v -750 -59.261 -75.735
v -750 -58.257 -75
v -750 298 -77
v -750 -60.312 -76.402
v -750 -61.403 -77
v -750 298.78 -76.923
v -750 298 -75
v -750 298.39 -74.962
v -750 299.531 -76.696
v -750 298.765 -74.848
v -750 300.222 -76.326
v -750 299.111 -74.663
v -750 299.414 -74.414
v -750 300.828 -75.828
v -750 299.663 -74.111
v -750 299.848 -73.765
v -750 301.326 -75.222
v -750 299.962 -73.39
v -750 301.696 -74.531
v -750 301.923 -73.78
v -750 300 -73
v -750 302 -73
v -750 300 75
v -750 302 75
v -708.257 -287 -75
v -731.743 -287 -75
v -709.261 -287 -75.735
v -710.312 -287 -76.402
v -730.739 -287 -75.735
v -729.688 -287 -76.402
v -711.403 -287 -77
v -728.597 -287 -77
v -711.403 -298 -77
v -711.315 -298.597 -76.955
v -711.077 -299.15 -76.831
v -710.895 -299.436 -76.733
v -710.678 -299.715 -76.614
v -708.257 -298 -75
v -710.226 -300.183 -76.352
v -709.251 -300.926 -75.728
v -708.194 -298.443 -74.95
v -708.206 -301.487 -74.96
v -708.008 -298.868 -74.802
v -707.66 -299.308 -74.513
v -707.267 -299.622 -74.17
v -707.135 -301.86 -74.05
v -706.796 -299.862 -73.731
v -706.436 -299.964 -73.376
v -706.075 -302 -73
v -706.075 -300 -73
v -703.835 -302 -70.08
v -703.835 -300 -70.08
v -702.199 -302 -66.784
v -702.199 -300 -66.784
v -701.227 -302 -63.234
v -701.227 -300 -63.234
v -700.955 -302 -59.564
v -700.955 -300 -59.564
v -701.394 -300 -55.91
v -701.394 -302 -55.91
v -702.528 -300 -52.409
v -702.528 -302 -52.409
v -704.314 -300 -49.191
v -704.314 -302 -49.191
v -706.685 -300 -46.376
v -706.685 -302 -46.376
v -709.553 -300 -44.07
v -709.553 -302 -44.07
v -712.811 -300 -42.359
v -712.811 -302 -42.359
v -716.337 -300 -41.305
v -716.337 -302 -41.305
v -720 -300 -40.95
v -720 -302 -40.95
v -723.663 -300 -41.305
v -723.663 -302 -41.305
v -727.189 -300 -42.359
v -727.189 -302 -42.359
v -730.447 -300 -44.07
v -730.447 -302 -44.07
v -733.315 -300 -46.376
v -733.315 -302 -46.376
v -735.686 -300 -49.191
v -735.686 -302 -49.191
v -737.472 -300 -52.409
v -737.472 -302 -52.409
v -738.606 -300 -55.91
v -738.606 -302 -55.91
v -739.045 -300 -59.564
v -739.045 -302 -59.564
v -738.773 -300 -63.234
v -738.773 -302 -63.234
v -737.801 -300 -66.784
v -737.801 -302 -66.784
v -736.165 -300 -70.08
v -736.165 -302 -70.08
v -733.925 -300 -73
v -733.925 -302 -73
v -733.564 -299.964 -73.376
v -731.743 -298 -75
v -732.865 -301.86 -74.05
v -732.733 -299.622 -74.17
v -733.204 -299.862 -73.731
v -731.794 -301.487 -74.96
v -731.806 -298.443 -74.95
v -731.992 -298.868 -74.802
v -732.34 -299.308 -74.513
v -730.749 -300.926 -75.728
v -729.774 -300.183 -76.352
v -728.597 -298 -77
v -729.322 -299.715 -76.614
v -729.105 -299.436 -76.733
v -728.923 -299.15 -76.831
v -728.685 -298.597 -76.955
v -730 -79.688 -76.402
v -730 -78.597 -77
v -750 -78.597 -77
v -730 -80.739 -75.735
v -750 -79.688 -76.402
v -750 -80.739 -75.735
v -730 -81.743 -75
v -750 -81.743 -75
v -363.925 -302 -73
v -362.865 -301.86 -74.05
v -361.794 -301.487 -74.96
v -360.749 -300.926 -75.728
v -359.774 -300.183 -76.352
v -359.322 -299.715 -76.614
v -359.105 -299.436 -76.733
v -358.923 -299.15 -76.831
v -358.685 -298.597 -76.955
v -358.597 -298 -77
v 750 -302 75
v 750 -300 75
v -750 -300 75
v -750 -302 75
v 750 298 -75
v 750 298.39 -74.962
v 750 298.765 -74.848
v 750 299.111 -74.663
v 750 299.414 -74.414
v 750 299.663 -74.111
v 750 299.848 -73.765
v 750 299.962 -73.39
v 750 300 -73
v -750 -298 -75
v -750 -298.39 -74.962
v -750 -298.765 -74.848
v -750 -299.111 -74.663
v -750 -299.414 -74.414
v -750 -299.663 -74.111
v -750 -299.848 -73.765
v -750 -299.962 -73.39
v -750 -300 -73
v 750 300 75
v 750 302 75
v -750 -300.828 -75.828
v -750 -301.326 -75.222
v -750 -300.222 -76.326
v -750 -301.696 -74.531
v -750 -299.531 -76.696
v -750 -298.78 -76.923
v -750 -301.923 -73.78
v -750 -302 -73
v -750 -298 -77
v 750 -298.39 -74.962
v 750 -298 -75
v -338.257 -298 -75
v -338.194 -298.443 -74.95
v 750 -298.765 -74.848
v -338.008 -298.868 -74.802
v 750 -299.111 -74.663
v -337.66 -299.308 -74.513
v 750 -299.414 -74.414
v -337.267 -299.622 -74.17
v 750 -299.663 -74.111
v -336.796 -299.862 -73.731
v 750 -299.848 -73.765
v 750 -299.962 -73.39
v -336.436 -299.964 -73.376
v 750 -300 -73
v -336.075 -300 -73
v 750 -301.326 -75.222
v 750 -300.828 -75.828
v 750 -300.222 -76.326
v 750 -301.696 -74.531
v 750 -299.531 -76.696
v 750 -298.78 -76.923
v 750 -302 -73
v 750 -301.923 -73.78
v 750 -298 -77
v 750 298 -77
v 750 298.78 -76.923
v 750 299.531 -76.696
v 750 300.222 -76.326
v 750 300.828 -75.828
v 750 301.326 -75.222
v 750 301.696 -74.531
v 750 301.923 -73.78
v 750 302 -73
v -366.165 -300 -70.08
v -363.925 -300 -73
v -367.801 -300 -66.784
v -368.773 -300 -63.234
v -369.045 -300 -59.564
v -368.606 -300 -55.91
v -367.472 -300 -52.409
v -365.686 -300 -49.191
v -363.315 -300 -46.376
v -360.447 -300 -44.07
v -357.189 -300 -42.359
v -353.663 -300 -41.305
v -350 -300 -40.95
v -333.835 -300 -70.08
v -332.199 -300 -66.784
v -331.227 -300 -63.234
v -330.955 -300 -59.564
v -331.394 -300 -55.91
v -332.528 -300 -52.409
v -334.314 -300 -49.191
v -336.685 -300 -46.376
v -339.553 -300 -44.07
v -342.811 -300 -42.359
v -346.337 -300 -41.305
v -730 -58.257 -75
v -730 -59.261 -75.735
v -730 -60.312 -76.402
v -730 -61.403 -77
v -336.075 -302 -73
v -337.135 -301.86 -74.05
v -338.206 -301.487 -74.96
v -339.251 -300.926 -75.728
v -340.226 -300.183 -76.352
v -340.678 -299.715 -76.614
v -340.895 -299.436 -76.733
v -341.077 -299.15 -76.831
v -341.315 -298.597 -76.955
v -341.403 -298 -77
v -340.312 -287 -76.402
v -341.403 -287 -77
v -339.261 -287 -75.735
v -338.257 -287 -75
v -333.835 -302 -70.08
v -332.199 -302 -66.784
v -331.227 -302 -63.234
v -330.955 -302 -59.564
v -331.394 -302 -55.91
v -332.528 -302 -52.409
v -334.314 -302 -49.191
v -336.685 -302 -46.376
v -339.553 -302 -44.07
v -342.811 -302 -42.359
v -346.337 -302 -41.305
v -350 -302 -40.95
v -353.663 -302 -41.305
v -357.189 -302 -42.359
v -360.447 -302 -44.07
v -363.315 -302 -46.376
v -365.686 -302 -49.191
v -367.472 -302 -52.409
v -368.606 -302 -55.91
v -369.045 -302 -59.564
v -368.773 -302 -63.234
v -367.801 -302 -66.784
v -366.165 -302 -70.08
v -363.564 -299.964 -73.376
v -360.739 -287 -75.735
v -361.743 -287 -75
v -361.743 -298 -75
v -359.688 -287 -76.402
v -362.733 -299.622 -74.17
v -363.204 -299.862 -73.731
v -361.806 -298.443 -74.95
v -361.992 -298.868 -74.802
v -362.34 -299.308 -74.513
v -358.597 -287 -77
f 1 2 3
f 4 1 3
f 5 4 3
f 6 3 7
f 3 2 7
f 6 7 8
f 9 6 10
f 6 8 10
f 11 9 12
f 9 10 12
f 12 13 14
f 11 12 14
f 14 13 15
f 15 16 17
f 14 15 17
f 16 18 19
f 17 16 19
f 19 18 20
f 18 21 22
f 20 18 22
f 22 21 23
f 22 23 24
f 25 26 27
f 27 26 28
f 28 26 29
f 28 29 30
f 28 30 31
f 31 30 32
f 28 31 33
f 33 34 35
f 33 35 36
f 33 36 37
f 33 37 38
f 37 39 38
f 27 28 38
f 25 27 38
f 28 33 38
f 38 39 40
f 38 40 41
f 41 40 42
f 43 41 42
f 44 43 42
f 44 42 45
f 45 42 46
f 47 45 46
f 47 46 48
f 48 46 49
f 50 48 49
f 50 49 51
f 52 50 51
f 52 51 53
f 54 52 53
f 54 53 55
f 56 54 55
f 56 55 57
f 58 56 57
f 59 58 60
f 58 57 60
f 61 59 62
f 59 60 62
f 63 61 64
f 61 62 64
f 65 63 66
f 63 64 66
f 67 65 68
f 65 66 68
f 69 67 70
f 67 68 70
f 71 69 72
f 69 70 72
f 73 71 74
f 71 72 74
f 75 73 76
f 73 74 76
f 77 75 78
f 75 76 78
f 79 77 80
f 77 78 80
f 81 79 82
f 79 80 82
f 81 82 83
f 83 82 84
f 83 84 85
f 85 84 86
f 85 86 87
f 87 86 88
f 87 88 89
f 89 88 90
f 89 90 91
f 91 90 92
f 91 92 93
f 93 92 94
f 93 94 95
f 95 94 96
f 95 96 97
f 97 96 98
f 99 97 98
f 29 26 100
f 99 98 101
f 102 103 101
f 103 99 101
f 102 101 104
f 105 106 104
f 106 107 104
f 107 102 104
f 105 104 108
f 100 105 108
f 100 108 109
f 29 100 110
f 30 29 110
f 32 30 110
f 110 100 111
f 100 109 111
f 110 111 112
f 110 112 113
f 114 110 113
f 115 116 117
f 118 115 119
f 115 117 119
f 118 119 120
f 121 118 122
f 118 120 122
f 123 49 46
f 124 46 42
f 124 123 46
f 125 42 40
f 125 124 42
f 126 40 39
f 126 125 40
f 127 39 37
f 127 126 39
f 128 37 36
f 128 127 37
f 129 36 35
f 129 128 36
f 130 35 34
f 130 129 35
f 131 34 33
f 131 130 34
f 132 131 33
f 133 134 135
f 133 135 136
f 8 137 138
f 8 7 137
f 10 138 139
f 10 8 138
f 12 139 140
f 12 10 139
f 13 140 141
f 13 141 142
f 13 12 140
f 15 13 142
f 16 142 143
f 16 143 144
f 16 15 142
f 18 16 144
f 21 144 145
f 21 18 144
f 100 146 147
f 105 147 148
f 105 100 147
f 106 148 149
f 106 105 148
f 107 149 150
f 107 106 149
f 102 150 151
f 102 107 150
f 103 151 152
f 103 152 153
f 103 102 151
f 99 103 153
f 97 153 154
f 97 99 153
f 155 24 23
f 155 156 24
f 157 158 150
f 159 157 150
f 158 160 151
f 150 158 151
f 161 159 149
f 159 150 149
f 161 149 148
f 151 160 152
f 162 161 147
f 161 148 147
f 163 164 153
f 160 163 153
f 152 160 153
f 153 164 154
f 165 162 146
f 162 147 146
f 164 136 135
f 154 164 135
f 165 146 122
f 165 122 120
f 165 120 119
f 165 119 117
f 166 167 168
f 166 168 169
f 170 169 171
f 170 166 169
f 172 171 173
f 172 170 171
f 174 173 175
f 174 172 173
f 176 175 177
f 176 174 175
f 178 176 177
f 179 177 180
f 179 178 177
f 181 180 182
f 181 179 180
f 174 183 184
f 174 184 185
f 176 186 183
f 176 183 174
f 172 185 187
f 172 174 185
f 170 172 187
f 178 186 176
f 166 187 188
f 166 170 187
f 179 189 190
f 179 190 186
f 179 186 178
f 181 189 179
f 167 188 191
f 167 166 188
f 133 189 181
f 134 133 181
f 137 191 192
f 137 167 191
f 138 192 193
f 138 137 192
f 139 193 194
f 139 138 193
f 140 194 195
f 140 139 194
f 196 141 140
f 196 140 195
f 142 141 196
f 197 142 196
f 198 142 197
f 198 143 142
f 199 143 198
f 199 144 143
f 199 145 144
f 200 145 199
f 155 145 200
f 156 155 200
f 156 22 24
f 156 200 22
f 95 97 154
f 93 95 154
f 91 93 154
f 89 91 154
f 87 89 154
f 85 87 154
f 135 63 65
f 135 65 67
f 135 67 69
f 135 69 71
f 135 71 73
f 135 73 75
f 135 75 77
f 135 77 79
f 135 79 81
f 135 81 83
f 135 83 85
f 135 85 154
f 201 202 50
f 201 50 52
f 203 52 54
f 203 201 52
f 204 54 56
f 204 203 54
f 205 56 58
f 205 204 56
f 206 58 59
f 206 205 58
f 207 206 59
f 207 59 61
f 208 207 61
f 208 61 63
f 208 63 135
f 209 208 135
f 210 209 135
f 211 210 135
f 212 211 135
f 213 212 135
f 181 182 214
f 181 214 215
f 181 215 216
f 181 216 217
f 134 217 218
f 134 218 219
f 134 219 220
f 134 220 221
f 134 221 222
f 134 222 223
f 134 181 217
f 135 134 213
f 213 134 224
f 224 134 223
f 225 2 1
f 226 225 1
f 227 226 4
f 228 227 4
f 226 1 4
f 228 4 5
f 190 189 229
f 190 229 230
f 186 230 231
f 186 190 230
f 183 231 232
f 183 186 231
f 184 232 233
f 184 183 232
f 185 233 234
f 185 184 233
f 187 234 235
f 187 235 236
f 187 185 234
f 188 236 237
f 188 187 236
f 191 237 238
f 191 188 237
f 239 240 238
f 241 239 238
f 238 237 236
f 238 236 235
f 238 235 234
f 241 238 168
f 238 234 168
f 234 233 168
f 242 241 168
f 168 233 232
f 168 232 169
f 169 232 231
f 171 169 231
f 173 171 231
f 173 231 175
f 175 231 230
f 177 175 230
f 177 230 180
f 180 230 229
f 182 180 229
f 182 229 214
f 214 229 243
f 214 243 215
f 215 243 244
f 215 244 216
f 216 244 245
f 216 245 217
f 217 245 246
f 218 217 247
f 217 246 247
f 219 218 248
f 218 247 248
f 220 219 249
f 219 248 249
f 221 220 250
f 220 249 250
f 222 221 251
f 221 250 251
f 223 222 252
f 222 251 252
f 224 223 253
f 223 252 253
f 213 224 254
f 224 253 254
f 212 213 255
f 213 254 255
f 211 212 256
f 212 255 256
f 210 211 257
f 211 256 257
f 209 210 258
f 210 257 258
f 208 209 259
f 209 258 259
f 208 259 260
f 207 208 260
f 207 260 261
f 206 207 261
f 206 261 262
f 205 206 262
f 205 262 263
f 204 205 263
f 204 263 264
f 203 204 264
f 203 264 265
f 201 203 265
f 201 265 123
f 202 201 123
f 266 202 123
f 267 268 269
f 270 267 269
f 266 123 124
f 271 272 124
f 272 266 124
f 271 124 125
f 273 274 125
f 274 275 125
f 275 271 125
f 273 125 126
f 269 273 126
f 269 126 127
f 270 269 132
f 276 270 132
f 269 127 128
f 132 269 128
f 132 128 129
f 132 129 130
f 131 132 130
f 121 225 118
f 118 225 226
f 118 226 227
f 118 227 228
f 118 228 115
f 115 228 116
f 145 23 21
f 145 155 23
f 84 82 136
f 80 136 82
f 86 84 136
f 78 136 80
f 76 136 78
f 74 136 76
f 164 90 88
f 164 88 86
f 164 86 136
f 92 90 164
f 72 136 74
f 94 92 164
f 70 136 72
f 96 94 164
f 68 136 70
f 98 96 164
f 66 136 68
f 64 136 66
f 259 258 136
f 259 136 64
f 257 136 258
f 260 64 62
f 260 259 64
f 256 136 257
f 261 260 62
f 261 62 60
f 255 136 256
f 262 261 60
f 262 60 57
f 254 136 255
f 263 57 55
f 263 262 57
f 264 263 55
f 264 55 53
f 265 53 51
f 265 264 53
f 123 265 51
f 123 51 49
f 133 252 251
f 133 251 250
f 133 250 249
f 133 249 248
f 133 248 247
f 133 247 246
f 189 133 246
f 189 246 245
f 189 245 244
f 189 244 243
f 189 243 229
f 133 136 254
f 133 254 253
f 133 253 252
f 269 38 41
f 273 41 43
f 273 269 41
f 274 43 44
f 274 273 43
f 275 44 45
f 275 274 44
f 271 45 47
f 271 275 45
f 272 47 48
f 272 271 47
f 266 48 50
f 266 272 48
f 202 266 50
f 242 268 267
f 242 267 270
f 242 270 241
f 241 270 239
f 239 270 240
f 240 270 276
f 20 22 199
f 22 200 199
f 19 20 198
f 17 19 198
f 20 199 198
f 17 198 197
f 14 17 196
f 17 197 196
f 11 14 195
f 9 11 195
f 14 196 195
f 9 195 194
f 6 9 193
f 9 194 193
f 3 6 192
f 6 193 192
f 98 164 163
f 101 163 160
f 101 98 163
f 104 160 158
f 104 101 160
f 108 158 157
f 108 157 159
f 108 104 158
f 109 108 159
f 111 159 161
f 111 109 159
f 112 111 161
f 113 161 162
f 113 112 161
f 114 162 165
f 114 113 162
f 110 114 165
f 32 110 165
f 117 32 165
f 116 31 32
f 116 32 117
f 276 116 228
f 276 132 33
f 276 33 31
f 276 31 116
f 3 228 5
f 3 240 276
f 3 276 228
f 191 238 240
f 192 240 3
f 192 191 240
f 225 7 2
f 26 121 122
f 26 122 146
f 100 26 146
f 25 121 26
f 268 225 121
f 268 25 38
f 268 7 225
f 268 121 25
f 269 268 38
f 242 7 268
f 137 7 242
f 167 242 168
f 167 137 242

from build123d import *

# Parameters (mm, degrees)
F1_DEPTH = 750
F2_R     = 2
F3_R     = 4
F4_R     = 19.05
F5_DEPTH = 15
F6_R     = 19.05
F7_DEPTH = 20


with BuildPart() as f1:
    # F0 (on Right) → F1 (new body, symmetric)
    with BuildSketch(Plane.YZ):
        Polygon((300, -75), (-300, -75), (-300, 75), (-302, 75), (-302, -77), (302, -77), (302, 75), (300, 75), align=None)
    extrude(amount=F1_DEPTH, both=True)

    # F2
    f2_edges = [f1.edges().sort_by_distance(p)[0] for p in [
        (0, 300, -75),
        (0, -300, -75),
    ]]
    fillet(f2_edges, radius=F2_R)

    # F3
    f3_edges = [f1.edges().sort_by_distance(p)[0] for p in [
        (0, -302, -77),
        (0, 302, -77),
    ]]
    fillet(f3_edges, radius=F3_R)

    # F4 (on face) → F5 (cut)
    with BuildSketch(Plane.XZ.offset(302)):
        with Locations((-720, -60)):
            Circle(F4_R)
        with Locations((-350, -60)):
            Circle(F4_R)
    extrude(amount=-F5_DEPTH, mode=Mode.SUBTRACT)

    # F6 (on face) → F7 (cut)
    with BuildSketch(Plane(origin=(-750, 0, 0), x_dir=(0, -1, 0), z_dir=(-1, 0, 0))):
        with Locations((70, -60)):
            Circle(F6_R)
    extrude(amount=-F7_DEPTH, mode=Mode.SUBTRACT)


solid = f1.part
